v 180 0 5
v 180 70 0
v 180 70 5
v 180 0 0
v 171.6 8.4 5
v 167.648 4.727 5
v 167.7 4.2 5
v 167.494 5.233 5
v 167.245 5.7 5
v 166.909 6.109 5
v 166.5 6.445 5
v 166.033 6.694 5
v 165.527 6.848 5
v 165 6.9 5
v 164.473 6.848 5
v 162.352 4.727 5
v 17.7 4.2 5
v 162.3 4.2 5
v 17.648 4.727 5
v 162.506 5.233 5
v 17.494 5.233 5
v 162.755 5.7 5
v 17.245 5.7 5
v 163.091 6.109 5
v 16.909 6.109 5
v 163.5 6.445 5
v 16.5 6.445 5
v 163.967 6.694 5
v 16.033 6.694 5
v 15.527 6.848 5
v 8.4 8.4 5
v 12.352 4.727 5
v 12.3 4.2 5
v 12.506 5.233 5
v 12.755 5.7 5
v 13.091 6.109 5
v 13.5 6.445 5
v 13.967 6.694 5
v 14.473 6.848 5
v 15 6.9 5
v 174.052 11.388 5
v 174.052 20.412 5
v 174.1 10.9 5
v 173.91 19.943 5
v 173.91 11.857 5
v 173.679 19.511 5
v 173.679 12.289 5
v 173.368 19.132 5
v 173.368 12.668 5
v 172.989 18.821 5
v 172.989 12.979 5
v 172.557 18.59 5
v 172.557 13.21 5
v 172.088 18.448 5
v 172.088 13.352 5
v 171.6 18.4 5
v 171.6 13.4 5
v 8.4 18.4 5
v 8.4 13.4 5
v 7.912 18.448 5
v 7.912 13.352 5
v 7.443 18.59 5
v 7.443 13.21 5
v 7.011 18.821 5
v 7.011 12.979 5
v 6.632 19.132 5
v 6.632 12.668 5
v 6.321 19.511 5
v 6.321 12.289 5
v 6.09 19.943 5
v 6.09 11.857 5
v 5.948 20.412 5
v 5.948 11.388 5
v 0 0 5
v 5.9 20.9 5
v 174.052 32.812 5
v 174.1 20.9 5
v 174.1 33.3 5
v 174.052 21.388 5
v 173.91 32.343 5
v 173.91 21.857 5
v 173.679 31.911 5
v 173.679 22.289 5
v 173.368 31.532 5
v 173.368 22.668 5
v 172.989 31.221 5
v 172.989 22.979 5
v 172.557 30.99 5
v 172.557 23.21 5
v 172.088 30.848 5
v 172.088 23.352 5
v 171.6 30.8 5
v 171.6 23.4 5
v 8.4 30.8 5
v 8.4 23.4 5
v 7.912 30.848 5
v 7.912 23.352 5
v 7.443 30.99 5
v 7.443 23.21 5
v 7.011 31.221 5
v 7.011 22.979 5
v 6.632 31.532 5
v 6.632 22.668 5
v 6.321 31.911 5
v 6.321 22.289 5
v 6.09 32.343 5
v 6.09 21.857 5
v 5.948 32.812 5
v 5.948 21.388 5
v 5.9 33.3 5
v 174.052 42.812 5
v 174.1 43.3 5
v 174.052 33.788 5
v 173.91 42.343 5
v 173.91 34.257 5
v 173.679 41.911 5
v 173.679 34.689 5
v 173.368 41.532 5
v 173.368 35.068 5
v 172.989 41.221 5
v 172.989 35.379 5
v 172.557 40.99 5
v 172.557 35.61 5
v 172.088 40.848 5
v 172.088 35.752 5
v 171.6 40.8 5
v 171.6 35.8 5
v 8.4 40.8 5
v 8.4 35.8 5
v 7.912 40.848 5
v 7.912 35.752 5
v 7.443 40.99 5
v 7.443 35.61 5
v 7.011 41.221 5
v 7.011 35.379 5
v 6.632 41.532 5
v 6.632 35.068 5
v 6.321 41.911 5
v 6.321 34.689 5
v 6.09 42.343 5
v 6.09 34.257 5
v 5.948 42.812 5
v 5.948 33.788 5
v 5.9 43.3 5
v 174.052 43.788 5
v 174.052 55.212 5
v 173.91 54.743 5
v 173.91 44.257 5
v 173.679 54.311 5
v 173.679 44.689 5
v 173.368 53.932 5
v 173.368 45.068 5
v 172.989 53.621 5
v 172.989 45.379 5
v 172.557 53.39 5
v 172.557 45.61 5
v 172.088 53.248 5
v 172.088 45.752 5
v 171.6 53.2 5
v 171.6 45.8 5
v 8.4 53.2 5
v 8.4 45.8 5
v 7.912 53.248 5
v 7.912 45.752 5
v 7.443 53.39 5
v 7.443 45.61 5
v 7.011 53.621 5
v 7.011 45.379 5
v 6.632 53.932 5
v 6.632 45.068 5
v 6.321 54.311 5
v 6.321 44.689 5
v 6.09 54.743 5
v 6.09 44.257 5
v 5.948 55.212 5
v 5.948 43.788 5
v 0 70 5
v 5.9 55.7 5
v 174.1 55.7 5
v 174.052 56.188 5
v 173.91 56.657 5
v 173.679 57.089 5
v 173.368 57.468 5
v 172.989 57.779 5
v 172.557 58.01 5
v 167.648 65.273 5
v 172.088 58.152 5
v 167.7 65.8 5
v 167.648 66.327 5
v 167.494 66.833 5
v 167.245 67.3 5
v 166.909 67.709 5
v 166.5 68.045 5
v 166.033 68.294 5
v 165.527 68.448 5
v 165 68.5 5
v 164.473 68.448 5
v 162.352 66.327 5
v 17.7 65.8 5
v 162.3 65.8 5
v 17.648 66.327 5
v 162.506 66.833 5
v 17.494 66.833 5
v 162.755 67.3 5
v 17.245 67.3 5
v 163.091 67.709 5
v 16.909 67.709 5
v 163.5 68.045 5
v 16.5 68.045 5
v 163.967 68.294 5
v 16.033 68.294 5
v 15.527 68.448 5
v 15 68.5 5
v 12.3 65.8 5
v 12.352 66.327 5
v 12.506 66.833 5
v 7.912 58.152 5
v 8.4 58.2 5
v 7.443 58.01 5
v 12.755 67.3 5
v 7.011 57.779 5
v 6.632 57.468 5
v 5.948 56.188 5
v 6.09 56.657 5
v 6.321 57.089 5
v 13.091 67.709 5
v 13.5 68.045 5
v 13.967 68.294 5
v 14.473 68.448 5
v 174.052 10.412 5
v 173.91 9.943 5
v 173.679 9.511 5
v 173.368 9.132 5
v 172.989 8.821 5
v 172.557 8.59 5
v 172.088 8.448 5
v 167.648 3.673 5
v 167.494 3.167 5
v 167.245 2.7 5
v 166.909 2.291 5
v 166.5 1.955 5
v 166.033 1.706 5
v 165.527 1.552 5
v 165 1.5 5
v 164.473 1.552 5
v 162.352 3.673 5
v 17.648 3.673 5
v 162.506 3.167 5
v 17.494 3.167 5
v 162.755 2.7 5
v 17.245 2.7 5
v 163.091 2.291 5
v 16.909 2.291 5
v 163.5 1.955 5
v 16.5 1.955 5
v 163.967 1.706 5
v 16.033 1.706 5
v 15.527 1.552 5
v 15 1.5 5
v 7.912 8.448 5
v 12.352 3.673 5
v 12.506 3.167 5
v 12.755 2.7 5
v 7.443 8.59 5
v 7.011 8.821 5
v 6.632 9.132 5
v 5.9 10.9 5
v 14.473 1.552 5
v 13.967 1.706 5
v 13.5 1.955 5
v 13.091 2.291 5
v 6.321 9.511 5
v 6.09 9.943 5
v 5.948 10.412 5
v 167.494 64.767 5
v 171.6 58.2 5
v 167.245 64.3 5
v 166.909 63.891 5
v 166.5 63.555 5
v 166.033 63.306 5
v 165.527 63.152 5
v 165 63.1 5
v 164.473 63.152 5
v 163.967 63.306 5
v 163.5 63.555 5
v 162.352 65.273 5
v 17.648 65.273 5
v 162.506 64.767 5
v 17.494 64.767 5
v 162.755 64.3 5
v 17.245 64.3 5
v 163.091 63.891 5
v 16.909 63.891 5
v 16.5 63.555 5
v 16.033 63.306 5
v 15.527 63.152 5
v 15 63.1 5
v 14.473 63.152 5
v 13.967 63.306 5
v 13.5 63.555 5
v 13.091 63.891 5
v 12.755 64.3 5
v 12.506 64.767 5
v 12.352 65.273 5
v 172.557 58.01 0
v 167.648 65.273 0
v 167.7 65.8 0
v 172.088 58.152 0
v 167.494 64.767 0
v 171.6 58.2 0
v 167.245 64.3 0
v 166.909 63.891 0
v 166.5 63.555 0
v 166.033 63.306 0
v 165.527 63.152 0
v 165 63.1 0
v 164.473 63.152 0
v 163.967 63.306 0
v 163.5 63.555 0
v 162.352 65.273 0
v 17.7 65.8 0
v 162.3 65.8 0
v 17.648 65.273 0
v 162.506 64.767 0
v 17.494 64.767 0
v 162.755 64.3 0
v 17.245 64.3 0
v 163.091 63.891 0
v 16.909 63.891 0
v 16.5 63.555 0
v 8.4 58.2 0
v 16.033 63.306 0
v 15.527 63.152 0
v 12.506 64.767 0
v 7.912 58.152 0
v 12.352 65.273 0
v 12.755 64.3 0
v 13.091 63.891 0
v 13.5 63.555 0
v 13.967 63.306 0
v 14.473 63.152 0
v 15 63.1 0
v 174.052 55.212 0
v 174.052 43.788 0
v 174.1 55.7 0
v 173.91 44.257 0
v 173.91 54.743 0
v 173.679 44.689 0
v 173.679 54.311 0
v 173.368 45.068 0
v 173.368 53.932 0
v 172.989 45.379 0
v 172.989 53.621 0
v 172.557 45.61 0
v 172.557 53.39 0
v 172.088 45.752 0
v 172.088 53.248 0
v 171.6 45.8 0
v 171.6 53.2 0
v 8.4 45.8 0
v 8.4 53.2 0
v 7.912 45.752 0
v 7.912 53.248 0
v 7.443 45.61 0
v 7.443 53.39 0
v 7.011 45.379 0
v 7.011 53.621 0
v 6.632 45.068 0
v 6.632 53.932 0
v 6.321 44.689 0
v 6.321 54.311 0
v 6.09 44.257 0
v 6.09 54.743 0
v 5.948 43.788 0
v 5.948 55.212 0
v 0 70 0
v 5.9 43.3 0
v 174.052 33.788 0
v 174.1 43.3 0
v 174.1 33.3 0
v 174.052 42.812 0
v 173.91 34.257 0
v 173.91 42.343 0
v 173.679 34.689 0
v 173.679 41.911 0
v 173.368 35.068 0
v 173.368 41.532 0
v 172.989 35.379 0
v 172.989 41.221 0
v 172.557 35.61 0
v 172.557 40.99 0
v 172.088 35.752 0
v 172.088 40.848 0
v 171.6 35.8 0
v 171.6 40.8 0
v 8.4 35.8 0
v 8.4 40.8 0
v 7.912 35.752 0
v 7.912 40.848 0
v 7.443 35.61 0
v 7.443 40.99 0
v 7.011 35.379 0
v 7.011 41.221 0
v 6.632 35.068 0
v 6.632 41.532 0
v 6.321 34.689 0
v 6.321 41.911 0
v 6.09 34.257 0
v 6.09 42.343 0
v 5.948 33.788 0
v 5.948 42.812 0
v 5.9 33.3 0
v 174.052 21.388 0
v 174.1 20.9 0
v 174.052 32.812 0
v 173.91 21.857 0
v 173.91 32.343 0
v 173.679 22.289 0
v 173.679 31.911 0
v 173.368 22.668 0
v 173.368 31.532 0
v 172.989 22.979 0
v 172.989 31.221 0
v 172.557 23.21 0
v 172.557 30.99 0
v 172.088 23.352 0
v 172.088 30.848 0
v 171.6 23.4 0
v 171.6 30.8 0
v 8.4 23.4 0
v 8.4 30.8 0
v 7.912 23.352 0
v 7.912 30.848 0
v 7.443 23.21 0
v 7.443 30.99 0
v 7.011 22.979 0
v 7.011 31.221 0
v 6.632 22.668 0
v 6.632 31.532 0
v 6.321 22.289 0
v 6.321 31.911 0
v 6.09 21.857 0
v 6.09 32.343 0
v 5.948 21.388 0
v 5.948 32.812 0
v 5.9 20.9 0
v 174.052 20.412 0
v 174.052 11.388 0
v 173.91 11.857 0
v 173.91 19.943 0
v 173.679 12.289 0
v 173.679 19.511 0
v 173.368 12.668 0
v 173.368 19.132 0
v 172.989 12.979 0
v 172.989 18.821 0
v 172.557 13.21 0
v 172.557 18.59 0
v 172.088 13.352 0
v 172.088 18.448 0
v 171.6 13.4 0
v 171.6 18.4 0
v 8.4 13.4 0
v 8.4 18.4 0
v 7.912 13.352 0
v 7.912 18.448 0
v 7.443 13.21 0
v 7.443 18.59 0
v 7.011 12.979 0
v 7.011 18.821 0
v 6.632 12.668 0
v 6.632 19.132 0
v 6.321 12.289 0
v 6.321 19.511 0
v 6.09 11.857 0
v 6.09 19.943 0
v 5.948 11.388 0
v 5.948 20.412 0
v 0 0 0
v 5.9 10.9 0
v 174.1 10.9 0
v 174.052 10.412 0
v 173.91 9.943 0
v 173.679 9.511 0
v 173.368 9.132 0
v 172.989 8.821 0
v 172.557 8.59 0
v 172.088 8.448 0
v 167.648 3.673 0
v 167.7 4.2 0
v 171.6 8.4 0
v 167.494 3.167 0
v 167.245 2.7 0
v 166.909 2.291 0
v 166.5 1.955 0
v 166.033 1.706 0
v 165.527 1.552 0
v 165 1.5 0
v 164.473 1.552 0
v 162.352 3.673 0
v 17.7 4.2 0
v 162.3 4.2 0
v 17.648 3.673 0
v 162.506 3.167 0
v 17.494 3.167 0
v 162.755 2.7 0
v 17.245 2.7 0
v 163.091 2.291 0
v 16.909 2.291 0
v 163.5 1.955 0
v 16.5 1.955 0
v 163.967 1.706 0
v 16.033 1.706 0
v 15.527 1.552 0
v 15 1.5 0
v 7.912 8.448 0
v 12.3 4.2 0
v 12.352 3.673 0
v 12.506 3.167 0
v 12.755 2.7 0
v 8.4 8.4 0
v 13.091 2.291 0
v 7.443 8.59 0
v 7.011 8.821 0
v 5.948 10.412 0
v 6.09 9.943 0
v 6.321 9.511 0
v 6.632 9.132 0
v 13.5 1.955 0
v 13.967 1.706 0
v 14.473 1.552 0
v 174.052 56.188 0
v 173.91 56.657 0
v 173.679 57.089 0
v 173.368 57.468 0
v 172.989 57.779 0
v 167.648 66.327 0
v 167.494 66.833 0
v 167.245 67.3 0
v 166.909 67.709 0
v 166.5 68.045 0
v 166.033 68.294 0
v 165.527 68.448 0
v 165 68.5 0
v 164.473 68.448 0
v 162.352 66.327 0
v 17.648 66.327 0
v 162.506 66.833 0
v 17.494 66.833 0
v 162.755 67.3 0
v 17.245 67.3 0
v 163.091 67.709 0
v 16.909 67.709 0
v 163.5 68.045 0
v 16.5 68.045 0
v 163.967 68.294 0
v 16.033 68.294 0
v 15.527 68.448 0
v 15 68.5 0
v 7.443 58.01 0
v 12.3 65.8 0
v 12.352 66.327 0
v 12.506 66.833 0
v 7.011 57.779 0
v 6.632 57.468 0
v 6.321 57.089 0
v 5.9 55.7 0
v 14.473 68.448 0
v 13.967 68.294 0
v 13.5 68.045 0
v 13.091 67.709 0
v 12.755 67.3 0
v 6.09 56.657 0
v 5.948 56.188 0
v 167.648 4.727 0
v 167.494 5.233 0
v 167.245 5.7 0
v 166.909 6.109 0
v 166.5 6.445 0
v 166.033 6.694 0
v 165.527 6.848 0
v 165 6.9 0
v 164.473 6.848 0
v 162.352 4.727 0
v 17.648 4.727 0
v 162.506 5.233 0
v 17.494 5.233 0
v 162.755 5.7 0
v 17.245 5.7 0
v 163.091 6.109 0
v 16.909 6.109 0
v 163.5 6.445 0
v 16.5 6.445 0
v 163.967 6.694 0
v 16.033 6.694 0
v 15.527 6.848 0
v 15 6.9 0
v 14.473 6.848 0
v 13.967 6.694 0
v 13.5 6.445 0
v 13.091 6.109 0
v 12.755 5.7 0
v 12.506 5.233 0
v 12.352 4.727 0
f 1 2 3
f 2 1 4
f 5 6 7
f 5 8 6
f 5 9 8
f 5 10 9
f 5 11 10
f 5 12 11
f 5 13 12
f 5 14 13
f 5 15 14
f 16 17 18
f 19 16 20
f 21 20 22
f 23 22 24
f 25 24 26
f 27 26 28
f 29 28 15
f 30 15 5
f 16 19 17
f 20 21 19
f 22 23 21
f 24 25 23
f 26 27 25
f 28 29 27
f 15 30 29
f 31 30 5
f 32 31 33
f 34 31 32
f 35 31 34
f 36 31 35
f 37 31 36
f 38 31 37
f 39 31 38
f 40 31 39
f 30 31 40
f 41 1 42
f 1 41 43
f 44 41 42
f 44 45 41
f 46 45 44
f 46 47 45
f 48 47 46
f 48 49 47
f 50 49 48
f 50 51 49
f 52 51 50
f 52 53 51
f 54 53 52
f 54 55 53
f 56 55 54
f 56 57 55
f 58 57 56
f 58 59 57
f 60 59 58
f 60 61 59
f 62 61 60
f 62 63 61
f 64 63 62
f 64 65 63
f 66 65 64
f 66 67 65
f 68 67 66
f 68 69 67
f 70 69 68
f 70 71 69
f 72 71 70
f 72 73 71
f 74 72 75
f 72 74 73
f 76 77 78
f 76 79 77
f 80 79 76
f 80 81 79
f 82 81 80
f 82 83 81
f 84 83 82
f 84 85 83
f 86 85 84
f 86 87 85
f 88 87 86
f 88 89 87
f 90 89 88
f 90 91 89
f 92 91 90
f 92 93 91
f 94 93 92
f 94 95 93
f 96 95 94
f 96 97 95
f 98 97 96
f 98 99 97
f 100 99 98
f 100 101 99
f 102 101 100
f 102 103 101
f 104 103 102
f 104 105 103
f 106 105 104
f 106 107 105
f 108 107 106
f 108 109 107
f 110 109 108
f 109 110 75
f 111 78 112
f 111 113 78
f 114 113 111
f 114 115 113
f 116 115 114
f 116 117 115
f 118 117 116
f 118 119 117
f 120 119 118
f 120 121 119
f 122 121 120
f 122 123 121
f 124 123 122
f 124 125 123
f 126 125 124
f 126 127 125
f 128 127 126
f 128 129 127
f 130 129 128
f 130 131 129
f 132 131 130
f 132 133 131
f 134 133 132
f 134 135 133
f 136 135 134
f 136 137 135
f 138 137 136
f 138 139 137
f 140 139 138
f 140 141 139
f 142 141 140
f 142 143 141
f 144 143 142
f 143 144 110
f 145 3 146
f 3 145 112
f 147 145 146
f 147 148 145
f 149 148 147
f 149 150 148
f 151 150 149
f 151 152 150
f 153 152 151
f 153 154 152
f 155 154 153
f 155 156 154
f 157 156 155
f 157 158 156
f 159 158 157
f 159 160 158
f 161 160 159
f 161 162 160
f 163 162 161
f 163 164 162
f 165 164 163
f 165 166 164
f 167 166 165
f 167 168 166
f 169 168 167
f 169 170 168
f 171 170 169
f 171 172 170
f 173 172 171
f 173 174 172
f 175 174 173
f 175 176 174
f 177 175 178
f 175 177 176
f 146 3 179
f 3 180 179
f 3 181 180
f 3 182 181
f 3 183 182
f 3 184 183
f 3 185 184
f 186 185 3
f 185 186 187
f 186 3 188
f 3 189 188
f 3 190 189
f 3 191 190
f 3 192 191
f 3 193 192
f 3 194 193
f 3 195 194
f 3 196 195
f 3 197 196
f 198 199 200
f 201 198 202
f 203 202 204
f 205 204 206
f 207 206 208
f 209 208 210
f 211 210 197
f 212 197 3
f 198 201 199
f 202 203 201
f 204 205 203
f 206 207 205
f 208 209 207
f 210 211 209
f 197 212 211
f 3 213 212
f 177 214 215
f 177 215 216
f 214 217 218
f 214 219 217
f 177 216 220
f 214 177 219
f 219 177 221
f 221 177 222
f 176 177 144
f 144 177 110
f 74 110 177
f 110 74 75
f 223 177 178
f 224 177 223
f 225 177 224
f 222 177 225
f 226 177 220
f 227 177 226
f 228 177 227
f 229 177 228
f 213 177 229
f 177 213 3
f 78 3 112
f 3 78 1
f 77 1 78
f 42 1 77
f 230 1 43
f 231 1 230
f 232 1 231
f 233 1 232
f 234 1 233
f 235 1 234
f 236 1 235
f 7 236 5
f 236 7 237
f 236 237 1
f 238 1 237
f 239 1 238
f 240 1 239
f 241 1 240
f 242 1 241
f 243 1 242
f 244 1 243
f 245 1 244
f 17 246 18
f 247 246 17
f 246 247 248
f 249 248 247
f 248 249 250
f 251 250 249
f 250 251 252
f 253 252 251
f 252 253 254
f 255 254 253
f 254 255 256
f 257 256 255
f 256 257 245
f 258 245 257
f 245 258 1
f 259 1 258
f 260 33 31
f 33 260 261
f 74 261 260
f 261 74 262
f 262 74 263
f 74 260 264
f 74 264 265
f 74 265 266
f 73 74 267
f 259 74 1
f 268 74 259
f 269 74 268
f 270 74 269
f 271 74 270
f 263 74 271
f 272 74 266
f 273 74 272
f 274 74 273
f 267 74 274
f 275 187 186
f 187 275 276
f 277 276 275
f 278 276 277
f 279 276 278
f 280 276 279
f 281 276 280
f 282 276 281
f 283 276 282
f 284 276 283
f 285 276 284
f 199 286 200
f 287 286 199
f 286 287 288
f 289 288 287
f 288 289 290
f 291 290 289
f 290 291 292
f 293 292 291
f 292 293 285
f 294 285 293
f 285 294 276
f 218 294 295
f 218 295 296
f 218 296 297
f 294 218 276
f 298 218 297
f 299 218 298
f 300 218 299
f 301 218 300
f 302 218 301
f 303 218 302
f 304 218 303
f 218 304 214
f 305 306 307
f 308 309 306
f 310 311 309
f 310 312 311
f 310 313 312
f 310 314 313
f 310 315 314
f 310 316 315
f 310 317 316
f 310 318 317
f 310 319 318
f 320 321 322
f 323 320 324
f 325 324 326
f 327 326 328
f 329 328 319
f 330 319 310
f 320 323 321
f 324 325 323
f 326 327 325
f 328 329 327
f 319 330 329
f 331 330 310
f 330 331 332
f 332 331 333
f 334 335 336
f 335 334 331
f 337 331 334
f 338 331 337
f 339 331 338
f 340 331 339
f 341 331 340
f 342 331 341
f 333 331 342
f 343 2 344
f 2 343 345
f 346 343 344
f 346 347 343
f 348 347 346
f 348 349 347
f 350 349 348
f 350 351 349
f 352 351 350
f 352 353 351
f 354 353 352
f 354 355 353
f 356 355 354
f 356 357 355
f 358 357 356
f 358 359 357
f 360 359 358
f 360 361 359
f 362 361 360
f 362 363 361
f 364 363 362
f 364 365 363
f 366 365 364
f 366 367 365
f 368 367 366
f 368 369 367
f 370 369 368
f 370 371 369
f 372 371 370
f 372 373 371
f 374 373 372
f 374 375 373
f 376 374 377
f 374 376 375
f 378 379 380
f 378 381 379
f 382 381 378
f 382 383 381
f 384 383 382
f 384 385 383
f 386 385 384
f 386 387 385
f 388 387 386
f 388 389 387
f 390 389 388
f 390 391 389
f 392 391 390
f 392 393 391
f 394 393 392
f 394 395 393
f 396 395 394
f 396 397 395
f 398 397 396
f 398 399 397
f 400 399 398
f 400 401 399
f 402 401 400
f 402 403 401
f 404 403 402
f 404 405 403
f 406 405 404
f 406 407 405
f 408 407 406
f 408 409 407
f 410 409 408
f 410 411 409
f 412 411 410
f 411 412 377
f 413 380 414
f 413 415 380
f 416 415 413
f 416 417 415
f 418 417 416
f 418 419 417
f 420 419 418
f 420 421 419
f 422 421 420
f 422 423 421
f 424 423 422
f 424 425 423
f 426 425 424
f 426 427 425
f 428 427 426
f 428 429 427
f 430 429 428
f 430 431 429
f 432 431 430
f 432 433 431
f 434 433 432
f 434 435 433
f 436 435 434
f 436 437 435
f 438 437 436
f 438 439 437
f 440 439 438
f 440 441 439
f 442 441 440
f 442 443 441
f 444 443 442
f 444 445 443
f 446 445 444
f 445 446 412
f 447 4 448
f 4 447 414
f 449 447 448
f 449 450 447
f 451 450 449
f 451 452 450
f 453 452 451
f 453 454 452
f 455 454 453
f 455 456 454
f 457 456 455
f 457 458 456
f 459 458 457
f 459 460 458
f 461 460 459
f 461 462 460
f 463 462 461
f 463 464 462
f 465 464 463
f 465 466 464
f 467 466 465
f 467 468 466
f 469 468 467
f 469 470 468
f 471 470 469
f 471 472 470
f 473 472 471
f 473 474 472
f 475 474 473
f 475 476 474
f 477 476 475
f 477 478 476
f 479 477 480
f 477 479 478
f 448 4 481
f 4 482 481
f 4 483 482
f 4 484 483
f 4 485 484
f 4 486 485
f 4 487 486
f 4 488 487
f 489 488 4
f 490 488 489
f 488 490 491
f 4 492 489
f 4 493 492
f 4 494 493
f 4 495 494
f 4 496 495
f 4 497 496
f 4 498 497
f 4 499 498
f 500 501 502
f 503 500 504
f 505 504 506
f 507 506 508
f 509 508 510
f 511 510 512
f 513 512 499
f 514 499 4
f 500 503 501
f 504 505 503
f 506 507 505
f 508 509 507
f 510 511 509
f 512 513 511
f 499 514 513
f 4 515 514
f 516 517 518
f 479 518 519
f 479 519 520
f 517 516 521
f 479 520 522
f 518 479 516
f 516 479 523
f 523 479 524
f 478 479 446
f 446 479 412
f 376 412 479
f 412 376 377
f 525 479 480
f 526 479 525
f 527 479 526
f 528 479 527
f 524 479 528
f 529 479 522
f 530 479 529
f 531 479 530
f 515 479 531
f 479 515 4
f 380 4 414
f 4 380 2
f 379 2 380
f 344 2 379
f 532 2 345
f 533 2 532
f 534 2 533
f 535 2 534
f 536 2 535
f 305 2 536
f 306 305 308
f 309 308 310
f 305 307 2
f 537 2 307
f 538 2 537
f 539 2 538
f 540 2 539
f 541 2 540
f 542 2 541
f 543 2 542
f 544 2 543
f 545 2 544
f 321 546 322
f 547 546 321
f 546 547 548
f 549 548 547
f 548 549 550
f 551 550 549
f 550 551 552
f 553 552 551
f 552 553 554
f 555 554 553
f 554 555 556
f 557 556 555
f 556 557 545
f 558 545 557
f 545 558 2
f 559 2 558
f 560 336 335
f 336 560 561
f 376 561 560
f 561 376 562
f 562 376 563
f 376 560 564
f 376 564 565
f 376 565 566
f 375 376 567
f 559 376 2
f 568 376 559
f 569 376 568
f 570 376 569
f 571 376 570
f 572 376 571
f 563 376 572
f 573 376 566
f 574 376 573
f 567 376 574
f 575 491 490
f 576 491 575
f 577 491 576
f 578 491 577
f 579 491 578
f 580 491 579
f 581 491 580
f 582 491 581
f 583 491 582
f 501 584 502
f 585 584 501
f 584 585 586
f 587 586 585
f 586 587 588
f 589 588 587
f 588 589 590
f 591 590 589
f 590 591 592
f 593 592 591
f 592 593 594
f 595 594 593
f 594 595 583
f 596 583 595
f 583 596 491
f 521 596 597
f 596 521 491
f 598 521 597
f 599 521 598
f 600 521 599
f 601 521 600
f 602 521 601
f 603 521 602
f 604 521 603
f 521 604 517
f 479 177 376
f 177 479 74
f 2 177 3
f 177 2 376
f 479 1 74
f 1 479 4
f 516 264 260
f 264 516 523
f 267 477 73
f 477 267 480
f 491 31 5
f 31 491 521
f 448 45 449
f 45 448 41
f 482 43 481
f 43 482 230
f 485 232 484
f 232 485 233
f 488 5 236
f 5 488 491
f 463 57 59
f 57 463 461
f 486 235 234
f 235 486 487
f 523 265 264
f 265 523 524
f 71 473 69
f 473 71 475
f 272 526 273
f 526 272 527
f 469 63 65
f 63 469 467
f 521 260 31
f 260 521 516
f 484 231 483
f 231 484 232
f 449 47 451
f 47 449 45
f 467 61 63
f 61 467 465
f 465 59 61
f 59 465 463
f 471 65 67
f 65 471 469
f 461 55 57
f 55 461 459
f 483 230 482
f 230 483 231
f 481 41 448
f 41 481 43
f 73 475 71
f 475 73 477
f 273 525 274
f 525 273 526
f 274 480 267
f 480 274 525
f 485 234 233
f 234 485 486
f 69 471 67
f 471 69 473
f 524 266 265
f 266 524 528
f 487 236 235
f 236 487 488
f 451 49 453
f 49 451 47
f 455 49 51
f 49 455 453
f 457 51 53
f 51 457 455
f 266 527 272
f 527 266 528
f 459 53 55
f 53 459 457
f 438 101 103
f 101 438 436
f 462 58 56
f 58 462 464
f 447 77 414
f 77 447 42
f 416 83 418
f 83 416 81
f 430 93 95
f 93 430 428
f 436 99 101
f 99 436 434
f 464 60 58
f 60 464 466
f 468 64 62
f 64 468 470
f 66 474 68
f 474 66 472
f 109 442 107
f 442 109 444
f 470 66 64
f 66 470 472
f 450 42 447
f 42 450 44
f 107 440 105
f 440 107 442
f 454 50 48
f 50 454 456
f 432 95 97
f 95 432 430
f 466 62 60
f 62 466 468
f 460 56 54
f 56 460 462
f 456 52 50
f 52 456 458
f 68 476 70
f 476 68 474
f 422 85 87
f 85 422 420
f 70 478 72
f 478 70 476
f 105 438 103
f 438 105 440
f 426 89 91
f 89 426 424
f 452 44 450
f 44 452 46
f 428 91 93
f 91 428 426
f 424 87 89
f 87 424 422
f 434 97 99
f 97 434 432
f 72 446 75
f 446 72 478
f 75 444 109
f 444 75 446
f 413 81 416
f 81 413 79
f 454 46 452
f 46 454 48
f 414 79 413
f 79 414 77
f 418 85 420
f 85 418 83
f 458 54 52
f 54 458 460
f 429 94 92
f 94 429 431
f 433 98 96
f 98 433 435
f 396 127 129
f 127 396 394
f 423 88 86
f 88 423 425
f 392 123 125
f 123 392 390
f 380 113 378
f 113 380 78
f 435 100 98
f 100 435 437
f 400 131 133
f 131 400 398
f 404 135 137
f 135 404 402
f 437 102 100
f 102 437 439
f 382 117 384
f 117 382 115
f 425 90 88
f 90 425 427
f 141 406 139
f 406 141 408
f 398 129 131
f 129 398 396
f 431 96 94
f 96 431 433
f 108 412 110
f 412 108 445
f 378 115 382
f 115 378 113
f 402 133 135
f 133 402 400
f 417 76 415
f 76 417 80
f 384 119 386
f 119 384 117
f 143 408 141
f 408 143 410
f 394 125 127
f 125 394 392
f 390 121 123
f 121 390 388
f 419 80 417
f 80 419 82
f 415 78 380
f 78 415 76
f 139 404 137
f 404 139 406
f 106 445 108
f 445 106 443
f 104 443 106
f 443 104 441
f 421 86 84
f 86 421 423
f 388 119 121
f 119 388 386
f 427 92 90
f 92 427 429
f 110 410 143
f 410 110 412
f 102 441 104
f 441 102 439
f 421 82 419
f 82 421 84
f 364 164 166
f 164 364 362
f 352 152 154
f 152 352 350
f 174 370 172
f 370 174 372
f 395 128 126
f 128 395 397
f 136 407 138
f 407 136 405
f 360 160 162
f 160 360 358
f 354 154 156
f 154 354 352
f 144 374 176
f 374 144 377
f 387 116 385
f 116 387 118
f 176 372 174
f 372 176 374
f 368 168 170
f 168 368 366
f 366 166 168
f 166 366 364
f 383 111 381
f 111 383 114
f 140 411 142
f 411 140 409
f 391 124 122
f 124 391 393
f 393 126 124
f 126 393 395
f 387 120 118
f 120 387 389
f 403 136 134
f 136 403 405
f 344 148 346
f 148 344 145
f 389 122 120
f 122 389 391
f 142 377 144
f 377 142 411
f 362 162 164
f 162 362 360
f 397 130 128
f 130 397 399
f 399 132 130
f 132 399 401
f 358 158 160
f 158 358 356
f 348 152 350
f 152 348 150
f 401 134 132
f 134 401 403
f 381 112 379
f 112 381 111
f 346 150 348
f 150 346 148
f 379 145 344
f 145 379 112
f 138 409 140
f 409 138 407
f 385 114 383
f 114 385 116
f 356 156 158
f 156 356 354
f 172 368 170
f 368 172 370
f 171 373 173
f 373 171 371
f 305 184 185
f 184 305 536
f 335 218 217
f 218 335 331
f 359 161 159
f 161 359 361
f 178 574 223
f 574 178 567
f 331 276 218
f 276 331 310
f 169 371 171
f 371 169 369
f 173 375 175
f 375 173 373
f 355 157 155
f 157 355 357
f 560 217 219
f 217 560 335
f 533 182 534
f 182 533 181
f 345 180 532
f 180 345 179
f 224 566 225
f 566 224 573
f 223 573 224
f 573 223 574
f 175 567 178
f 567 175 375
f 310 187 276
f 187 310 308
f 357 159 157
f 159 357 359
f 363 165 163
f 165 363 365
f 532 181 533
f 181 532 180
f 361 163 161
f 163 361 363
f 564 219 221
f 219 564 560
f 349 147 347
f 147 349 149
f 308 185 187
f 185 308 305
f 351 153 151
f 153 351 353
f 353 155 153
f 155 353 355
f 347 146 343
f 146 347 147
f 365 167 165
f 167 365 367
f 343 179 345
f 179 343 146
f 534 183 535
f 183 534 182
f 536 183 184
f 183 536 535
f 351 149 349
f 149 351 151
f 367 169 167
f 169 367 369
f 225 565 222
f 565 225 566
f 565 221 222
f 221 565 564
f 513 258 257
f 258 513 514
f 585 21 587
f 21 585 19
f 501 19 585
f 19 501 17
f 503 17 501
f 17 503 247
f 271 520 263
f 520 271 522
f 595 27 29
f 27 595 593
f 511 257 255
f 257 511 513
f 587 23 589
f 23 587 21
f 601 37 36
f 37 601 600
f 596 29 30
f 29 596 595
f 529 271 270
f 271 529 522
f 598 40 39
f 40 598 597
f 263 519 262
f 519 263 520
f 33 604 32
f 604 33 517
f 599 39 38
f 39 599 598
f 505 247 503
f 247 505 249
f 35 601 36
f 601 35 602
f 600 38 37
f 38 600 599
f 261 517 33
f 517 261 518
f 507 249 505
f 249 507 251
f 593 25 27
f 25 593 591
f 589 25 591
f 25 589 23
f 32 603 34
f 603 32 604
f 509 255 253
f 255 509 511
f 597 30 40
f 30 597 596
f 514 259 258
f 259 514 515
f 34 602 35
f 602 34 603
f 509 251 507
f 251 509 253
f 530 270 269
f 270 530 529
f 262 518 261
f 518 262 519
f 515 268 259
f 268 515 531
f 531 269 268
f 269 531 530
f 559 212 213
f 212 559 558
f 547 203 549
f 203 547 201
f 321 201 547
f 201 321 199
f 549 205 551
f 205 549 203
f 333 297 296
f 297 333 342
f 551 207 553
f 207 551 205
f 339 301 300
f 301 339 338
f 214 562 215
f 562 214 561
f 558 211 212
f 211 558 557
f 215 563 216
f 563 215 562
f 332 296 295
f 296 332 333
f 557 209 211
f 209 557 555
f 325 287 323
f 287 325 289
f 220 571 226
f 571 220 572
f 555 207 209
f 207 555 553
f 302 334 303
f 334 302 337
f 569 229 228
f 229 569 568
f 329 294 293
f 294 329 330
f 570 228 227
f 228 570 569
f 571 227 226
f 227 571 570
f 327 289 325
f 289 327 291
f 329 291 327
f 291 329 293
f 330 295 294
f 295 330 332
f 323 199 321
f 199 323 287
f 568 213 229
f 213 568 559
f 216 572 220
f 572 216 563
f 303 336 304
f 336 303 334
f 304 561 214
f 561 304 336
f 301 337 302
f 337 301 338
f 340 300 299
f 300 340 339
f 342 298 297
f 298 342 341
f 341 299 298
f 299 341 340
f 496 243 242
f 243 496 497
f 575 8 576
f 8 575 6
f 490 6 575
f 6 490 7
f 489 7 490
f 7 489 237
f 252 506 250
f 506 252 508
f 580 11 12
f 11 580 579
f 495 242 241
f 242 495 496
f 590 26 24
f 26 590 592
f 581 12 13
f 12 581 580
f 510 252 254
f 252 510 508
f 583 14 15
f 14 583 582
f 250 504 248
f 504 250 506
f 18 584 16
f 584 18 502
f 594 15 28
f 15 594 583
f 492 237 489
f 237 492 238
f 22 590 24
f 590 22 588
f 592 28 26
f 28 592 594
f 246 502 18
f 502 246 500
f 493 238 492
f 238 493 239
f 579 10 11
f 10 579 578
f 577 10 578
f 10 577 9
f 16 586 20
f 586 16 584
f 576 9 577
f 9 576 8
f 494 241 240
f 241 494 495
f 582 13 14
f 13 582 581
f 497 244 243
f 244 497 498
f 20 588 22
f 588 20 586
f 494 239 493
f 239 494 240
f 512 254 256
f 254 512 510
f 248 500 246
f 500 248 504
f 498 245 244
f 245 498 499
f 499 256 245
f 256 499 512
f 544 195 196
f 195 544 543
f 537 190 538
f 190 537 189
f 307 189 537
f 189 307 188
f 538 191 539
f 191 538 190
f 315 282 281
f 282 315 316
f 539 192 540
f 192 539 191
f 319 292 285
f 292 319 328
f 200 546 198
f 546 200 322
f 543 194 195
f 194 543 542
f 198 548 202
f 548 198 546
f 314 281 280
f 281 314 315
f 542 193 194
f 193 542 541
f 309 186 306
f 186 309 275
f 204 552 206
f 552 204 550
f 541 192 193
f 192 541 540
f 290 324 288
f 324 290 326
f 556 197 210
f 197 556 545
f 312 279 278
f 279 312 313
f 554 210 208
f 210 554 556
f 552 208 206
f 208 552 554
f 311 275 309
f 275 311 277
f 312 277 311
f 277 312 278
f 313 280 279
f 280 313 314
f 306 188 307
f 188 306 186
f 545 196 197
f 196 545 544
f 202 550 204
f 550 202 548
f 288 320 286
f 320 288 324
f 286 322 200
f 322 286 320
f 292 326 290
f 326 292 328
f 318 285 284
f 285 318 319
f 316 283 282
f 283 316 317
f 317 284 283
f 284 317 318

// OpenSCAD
$fn = 32;

// ----------------------------------------------------------------------
// Slotted panel: 180 x 70 mm, 5 рядов of slots
// ----------------------------------------------------------------------

// --- parameters (mm) ---
panel_w = 180;            // panel width
panel_d = 70;             // panel depth
thick = 5;                // panel thickness
slot_w = 5;               // slot width
pitch0 = 10;              // first row pitch
pitch_step = 2.4;         // pitch increase per row
margin = 8.4;             // margin around the slot field
rows = 5;                 // number of slot rows
mount_d = 5.4;            // mounting holes
mount_x = 75;             // mounting hole offset

difference() {
  union() {
    cube([panel_w, panel_d, thick]);
  }
  /* slot rows: stadium shaped cutters, 2.5 mm clear of both faces */
  /* row 0: pitch 10, length 163.2 */
  hull() {
    translate([8.4, 10.9, -2.5]) cylinder(h = thick + 5, d = slot_w);
    translate([171.6, 10.9, -2.5]) cylinder(h = thick + 5, d = slot_w);
  }
  /* row 1: pitch 12.4, length 163.2 */
  hull() {
    translate([8.4, 20.9, -2.5]) cylinder(h = thick + 5, d = slot_w);
    translate([171.6, 20.9, -2.5]) cylinder(h = thick + 5, d = slot_w);
  }
  /* row 2: pitch 10, length 163.2 */
  hull() {
    translate([8.4, 33.3, -2.5]) cylinder(h = thick + 5, d = slot_w);
    translate([171.6, 33.3, -2.5]) cylinder(h = thick + 5, d = slot_w);
  }
  /* row 3: pitch 12.4, length 163.2 */
  hull() {
    translate([8.4, 43.3, -2.5]) cylinder(h = thick + 5, d = slot_w);
    translate([171.6, 43.3, -2.5]) cylinder(h = thick + 5, d = slot_w);
  }
  /* row 4: pitch 10, length 163.2 */
  hull() {
    translate([8.4, 55.7, -2.5]) cylinder(h = thick + 5, d = slot_w);
    translate([171.6, 55.7, -2.5]) cylinder(h = thick + 5, d = slot_w);
  }
  translate([15, 4.2, -2.5]) cylinder(h = 10, d = mount_d);
  translate([15, 65.8, -2.5]) cylinder(h = 10, d = mount_d);
  translate([165, 4.2, -2.5]) cylinder(h = 10, d = mount_d);
  translate([165, 65.8, -2.5]) cylinder(h = 10, d = mount_d);
}
